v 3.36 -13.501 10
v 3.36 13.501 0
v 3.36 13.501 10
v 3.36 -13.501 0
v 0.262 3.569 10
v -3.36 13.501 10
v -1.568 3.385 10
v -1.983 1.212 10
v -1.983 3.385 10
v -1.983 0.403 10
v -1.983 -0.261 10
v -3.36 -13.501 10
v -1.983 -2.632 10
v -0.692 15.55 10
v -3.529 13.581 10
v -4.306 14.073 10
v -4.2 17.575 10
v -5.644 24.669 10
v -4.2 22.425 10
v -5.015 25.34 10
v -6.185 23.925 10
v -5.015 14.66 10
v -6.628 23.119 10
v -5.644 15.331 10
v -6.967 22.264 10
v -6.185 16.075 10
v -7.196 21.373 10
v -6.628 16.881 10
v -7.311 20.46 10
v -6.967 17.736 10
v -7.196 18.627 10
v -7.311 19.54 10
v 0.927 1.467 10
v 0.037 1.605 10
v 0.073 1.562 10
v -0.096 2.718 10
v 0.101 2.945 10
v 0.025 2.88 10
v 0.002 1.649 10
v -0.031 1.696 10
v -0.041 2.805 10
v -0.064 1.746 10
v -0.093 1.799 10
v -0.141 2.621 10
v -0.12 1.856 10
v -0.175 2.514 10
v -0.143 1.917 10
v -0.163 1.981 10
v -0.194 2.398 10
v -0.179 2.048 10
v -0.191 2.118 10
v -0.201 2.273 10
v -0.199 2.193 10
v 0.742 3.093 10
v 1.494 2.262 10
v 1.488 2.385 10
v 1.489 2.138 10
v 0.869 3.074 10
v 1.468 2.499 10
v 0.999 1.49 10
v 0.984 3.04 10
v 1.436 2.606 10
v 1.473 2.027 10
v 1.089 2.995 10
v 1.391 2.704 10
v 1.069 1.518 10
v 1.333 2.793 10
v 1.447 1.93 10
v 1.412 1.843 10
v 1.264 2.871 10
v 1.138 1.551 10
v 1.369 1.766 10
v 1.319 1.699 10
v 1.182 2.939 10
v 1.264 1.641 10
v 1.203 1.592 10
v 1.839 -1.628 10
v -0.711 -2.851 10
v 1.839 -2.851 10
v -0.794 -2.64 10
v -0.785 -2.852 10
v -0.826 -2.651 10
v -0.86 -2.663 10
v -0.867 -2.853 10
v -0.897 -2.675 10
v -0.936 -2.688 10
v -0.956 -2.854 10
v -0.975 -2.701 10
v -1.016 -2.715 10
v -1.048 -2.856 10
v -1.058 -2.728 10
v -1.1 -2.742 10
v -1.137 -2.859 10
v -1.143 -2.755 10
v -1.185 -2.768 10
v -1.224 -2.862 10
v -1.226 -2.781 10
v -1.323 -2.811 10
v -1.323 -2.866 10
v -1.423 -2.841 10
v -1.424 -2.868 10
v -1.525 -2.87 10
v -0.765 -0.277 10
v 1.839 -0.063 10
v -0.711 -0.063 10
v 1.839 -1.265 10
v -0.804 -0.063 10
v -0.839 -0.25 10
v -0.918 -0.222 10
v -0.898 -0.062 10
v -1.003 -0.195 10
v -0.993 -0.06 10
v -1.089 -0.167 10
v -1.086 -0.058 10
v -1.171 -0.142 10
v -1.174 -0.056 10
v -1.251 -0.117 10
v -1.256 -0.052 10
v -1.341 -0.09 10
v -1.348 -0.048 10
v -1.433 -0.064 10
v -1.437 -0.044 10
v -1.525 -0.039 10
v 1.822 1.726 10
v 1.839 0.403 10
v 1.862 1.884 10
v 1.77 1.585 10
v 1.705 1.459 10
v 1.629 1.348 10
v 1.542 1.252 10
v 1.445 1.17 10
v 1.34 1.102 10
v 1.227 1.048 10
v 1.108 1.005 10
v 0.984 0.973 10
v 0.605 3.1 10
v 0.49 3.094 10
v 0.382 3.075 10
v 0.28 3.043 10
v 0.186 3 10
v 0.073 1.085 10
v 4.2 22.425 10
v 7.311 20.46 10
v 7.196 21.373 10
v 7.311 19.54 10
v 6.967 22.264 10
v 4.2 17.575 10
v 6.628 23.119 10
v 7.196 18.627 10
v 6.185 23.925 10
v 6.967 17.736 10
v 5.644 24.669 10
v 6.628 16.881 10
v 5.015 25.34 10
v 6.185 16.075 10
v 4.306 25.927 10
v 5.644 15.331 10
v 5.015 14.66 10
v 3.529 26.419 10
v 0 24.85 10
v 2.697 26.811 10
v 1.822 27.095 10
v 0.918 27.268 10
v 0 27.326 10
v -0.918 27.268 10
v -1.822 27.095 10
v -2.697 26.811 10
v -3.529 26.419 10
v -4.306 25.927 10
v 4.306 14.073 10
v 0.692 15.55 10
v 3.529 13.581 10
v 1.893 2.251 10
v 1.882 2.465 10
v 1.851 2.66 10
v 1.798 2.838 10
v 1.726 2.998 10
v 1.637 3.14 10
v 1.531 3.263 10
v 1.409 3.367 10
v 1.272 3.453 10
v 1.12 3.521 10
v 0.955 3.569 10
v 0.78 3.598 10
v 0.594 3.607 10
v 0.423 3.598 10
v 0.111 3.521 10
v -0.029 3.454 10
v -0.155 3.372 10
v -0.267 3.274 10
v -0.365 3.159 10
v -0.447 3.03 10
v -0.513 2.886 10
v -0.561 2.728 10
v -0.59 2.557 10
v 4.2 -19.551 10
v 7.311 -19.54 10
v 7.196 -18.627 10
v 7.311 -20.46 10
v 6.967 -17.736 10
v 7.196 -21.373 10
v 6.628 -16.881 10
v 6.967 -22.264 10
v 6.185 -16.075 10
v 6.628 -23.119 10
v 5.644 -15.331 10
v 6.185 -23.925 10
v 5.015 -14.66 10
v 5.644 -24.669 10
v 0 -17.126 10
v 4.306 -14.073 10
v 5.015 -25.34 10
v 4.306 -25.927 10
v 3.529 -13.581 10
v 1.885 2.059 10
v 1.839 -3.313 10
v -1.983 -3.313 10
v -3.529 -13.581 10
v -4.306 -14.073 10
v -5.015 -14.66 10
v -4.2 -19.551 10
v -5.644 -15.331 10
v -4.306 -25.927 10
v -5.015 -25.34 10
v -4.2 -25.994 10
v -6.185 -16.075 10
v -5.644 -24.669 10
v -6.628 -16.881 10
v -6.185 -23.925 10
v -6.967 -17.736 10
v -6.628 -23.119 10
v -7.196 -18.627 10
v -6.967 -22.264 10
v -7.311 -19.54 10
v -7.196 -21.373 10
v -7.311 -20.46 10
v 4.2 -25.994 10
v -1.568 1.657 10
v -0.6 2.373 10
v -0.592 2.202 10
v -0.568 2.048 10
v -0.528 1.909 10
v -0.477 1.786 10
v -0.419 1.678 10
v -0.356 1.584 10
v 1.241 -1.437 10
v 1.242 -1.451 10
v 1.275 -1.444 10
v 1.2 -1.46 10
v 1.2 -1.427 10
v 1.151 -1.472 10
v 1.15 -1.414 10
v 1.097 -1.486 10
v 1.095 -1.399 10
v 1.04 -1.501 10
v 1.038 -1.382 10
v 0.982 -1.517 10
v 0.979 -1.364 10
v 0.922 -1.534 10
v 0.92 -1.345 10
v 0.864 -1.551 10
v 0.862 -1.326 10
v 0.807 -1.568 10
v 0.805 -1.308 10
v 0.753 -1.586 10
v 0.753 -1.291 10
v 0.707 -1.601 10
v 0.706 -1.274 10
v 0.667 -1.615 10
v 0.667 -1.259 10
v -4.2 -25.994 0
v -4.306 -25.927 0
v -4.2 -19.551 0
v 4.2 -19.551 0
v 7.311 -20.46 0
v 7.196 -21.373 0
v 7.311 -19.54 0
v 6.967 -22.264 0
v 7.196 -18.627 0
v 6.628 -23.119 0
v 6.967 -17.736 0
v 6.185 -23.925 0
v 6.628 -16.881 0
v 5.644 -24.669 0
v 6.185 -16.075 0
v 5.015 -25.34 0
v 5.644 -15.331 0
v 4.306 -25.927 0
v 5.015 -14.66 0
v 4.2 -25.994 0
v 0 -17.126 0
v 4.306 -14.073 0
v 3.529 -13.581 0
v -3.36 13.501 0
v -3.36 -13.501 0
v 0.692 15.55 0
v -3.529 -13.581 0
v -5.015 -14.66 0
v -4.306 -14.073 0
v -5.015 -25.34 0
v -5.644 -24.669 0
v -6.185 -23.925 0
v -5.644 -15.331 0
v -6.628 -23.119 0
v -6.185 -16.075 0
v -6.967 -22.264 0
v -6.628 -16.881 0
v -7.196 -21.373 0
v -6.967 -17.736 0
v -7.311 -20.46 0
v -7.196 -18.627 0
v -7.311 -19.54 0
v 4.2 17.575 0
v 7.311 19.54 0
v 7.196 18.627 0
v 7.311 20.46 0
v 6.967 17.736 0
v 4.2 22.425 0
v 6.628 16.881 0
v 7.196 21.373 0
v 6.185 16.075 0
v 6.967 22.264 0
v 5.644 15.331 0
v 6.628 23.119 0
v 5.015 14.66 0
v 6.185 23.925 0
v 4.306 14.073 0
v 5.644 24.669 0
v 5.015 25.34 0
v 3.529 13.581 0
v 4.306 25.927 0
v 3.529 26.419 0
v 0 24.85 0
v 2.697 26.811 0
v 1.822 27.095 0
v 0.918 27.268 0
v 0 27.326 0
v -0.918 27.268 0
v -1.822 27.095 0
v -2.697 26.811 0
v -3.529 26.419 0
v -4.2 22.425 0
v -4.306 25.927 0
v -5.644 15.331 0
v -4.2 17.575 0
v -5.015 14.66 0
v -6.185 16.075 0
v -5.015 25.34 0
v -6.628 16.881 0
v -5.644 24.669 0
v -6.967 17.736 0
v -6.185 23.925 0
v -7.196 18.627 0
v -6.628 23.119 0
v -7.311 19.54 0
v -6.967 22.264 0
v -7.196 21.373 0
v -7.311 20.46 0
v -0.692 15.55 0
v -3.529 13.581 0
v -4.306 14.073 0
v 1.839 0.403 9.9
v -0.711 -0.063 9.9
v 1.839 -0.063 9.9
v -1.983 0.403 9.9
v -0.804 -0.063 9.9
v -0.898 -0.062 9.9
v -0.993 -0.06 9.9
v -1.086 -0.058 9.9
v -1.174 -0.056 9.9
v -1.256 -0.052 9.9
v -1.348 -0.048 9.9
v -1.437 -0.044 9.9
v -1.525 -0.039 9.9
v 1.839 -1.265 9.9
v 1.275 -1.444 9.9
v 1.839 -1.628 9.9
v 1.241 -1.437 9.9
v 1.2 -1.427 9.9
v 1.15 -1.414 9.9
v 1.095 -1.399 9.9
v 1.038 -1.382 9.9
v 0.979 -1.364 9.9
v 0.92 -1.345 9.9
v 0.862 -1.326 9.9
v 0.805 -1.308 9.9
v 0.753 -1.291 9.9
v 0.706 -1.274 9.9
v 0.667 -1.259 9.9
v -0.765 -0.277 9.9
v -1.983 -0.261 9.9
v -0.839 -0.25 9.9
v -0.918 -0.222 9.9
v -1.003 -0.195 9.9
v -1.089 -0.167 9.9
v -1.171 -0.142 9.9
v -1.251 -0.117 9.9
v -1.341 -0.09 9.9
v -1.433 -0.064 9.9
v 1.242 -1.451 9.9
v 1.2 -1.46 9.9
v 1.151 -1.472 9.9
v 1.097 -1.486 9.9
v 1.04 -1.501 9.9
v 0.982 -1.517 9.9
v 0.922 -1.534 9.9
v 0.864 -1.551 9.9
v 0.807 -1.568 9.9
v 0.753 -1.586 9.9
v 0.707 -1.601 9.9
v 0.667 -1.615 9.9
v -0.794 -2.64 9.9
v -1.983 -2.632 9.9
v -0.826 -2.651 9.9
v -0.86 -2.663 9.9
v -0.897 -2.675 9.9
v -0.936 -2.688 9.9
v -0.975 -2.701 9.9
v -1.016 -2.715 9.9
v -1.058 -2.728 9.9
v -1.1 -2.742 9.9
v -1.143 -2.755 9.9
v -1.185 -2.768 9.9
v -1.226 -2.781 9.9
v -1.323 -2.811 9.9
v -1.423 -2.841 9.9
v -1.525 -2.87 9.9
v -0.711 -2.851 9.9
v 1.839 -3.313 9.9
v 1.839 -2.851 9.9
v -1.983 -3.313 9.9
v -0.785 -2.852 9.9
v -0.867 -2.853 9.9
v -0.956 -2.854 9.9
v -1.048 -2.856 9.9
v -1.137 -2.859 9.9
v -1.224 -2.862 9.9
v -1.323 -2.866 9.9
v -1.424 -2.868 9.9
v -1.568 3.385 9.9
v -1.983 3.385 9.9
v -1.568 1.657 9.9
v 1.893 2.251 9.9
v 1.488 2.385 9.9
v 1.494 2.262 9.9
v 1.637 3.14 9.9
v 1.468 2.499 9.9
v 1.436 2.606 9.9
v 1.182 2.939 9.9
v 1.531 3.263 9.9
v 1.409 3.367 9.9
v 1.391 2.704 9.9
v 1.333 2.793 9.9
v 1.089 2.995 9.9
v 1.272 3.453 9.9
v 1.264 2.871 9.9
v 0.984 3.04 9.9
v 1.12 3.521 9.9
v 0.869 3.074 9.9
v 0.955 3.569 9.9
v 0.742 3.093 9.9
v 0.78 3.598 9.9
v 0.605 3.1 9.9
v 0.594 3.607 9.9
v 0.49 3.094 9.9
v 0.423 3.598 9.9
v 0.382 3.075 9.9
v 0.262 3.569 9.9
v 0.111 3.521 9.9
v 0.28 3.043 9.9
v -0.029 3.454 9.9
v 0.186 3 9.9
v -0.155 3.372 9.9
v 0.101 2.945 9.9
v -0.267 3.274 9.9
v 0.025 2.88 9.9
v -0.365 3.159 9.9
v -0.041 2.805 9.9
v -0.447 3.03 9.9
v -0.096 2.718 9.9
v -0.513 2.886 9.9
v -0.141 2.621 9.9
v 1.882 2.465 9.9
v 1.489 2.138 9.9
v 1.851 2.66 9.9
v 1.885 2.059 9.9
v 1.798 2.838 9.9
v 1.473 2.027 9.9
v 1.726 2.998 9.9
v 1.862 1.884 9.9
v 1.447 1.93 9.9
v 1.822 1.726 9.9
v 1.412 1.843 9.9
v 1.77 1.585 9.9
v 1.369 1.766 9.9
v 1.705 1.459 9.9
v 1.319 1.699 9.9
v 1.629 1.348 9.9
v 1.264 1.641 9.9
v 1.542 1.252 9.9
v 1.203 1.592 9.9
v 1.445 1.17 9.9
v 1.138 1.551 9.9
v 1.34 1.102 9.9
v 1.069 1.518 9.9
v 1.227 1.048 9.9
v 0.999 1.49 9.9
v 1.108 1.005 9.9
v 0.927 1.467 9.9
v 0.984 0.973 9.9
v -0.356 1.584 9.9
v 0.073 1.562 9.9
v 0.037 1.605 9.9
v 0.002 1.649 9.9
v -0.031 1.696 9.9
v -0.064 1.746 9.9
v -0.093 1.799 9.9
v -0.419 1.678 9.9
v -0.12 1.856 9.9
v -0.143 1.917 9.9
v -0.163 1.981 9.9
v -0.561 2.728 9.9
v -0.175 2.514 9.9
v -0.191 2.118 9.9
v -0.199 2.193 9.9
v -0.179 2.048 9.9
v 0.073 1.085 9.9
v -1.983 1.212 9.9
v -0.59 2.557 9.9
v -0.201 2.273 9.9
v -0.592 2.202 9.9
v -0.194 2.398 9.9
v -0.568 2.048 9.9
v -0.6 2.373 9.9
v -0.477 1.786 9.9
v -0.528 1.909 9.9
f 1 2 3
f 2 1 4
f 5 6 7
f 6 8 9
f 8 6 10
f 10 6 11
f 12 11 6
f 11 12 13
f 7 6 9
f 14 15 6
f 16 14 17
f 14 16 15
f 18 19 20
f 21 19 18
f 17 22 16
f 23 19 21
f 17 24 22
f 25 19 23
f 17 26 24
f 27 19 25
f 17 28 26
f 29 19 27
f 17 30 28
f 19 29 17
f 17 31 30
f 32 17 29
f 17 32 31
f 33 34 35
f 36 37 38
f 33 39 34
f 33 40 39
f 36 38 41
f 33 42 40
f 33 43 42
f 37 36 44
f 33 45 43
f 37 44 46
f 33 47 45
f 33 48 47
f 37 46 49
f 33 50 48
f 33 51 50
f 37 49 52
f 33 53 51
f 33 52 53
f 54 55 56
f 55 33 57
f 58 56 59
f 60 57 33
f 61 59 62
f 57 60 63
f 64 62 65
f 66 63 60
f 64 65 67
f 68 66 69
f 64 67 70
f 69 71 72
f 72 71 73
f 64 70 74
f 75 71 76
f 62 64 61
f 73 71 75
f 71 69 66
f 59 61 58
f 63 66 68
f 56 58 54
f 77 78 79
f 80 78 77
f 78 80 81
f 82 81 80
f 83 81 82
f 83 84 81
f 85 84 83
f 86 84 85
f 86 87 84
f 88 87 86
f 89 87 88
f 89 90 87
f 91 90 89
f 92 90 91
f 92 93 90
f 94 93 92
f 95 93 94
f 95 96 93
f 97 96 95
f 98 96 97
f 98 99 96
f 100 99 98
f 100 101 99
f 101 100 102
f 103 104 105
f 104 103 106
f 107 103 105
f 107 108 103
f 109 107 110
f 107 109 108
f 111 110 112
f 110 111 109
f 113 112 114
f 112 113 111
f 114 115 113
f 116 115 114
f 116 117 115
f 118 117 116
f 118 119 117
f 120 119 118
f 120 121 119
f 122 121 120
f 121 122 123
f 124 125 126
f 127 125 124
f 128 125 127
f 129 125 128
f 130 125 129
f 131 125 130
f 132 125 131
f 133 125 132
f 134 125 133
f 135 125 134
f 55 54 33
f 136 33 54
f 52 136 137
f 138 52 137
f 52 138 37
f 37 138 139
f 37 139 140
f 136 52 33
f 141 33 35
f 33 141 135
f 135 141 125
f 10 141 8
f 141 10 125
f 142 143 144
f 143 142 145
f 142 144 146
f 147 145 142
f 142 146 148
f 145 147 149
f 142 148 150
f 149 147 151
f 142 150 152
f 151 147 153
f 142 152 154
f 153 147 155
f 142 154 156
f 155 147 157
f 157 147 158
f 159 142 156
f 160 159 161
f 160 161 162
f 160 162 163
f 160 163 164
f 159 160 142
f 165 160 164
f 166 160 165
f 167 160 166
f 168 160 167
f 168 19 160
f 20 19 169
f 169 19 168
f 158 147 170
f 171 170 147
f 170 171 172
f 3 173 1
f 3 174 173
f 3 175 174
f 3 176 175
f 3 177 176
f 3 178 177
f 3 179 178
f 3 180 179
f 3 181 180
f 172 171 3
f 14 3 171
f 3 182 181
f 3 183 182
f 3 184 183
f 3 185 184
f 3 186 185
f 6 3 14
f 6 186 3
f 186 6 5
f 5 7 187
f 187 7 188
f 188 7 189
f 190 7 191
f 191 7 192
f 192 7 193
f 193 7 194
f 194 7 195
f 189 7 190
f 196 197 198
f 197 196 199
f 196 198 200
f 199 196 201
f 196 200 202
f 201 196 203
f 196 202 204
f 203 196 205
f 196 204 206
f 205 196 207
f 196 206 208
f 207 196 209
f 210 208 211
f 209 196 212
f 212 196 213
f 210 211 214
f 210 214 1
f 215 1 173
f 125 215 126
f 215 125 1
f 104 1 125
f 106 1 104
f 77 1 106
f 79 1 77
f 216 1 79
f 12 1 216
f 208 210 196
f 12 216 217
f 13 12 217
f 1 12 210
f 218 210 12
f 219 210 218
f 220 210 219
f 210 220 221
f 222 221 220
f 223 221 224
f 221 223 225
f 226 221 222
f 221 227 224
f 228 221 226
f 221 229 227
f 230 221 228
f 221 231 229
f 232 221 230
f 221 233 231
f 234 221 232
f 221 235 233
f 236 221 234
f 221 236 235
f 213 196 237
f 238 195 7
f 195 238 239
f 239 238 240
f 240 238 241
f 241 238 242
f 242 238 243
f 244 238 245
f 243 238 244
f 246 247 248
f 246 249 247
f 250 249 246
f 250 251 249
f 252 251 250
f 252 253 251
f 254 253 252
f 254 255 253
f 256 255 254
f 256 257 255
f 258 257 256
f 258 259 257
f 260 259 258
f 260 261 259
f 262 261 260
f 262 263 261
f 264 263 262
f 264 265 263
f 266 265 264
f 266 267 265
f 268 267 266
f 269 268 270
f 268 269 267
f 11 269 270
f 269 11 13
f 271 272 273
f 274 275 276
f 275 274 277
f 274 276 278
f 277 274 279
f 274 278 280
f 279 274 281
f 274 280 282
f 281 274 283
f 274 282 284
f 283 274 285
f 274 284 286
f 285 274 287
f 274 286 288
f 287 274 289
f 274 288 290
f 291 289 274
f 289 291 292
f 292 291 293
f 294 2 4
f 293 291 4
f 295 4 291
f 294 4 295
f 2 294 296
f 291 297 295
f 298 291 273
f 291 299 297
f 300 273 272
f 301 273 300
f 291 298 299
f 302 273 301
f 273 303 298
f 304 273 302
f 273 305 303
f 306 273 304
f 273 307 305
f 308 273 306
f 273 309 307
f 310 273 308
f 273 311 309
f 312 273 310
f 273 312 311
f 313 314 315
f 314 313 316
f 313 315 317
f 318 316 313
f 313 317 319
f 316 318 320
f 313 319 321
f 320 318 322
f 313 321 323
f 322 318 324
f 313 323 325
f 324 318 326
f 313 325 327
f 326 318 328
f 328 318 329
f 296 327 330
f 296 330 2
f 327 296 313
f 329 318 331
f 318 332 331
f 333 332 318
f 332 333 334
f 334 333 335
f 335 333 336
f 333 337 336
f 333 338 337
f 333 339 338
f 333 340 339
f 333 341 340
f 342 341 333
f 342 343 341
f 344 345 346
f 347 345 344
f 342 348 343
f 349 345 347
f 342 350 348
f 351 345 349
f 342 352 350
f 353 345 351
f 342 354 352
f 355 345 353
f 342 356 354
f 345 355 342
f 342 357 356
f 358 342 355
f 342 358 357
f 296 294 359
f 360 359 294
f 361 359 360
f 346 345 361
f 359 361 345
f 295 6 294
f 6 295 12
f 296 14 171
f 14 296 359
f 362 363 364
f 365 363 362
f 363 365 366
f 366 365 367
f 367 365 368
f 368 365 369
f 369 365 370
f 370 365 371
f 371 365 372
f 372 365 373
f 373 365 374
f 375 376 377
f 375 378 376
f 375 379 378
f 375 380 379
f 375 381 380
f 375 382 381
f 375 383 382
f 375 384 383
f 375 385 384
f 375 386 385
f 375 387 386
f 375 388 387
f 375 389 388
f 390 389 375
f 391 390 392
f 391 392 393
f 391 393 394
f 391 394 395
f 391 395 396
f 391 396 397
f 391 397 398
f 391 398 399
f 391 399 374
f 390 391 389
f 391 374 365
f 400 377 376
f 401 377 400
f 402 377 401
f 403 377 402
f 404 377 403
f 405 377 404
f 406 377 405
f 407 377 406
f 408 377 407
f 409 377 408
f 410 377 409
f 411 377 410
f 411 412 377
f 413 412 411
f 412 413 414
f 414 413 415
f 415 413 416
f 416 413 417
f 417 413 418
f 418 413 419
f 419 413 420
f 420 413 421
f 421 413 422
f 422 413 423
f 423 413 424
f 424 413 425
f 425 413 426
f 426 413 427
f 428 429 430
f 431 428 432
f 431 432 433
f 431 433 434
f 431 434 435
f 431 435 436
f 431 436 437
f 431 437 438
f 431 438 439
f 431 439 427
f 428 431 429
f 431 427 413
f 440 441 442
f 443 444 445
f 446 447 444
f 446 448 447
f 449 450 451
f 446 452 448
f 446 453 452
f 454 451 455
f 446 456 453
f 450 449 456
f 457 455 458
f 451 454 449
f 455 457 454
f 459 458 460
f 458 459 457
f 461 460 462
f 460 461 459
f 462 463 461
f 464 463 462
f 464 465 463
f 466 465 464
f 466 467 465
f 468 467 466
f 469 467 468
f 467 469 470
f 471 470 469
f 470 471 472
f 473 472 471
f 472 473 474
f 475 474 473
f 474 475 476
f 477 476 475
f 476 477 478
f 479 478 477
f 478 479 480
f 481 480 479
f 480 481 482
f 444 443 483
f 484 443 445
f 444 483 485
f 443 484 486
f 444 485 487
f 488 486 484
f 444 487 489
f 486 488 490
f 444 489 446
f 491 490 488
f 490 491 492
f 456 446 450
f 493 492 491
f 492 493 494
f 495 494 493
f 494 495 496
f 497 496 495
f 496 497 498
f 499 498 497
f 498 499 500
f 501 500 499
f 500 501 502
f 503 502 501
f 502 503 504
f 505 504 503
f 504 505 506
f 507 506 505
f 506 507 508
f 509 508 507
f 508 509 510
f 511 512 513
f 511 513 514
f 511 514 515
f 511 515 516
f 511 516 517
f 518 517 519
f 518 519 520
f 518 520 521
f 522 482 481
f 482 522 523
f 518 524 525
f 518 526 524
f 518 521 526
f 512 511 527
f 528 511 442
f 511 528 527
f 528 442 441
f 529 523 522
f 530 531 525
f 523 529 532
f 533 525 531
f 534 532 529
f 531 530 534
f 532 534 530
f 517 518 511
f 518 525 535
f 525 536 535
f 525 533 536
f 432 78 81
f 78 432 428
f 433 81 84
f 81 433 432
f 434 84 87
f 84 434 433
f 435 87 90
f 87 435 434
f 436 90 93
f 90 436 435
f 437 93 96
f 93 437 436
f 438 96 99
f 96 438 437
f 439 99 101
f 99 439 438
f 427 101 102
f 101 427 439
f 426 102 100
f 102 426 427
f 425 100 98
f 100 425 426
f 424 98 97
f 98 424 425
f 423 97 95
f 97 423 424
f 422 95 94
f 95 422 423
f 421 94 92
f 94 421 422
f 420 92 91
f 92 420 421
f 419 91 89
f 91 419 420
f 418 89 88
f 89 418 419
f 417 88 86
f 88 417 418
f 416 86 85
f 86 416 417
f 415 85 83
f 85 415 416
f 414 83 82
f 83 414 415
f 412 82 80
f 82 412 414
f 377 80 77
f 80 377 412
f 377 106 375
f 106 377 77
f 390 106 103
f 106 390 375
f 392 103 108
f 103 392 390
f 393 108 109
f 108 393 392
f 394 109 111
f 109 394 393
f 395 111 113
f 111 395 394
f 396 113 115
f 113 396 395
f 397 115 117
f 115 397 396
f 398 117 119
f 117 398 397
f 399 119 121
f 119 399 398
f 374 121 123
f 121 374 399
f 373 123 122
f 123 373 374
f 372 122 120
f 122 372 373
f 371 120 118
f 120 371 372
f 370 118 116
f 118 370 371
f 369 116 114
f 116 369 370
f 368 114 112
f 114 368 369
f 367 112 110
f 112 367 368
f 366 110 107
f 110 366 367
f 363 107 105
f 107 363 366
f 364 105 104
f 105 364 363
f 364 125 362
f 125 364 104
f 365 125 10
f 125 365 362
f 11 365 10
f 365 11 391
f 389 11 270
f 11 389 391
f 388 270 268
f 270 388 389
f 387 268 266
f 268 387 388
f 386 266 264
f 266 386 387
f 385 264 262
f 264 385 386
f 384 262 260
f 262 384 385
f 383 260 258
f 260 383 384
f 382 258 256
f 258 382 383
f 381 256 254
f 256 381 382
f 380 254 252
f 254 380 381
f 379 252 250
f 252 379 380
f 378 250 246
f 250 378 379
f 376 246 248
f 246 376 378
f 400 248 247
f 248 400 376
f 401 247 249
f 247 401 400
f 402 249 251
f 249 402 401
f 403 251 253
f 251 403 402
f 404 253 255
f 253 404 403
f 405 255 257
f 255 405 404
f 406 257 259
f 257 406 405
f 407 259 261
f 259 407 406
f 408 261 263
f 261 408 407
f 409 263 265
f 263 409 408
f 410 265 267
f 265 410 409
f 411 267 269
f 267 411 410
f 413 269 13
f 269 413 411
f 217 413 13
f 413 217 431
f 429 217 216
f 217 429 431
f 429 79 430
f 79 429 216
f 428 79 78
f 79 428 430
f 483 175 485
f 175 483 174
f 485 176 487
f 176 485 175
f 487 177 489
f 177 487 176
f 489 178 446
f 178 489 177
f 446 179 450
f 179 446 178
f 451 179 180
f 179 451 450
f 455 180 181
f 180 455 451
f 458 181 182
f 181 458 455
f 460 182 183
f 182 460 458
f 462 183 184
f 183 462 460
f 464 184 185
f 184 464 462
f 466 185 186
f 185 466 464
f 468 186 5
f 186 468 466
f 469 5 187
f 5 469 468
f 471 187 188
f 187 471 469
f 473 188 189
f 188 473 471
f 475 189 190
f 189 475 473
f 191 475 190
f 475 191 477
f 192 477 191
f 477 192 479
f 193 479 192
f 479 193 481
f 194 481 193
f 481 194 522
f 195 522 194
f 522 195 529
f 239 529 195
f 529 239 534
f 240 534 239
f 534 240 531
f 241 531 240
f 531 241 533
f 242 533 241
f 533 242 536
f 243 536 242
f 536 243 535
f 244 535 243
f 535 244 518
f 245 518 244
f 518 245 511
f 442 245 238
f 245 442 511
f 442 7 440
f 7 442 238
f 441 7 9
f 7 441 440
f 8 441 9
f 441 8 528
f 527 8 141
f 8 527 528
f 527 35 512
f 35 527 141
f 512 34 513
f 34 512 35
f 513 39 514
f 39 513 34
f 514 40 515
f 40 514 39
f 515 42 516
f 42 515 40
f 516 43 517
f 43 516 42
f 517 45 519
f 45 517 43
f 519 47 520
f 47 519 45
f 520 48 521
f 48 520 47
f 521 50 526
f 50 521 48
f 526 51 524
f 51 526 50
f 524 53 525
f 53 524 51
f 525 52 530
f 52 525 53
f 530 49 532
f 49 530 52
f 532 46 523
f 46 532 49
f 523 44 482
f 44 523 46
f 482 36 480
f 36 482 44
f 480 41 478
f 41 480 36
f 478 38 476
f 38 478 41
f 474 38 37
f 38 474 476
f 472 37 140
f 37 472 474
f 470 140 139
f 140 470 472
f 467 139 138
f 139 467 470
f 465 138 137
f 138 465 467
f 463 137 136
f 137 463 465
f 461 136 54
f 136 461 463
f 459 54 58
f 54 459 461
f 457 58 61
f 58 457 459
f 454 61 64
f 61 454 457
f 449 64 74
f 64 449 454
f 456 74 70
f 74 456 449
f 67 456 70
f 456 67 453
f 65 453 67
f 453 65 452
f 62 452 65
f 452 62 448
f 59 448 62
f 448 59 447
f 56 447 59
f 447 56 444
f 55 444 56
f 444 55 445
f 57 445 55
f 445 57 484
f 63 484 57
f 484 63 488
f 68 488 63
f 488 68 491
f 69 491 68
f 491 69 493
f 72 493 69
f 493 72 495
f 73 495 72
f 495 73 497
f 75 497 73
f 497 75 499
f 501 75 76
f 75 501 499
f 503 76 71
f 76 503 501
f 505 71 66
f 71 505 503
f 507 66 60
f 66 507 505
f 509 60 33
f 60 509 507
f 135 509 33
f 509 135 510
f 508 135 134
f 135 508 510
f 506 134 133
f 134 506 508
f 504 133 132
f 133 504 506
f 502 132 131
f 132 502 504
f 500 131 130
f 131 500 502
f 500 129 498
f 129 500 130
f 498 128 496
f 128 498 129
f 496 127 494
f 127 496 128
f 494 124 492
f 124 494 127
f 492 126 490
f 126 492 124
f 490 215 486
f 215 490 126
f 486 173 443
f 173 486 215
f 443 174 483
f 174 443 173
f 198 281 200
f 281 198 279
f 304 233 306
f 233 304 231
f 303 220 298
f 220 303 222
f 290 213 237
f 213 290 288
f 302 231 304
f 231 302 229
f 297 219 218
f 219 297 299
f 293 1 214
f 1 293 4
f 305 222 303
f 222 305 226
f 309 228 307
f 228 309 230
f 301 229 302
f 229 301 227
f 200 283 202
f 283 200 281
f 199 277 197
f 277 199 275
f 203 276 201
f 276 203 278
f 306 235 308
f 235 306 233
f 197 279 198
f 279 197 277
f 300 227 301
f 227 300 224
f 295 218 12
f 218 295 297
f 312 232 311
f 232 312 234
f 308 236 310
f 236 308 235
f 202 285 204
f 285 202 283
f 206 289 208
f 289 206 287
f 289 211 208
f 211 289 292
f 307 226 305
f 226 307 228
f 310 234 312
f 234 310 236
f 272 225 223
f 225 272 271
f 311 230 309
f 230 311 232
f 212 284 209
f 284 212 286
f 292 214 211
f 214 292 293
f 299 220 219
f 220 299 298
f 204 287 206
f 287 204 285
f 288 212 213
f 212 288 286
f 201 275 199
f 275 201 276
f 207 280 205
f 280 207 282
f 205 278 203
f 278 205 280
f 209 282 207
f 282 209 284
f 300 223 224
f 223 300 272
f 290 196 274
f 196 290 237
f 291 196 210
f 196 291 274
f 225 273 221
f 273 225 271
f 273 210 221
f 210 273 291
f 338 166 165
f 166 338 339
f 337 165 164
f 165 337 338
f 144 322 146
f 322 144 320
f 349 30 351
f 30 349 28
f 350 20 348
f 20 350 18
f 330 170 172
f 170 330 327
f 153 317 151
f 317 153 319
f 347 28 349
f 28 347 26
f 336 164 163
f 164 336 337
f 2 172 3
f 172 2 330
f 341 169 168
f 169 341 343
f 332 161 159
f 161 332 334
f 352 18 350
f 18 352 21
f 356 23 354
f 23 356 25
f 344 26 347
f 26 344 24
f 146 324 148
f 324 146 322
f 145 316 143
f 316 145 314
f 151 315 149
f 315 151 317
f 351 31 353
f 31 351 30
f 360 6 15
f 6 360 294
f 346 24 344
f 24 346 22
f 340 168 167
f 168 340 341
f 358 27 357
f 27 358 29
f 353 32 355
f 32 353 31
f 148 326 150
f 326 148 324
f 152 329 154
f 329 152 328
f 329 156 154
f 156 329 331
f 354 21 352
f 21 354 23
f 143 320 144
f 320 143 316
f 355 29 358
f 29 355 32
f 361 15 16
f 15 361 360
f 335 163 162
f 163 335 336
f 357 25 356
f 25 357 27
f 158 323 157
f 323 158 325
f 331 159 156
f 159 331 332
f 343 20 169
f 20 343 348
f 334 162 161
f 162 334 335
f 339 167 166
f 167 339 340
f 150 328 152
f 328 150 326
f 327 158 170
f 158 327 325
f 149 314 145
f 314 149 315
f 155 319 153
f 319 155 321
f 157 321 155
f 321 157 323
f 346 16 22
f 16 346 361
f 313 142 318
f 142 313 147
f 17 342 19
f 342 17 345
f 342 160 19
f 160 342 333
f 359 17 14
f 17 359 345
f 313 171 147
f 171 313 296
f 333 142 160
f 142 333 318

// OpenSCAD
                        //******************************************
                        //* Base configuration
                        //******************************************
                        
                        //Set the nut properties
                        NUT_DIMENSION_METRIC = /*M*/5; // this is the number after M (eg. M4 -> 4)
                        // >>> NOTE <<<
                        // the metric parameter works ONLY for nuts from M1.6 up to M20
                        // If your nut has different size, please set it here:
                        // (leave -1 if you use metric)
                        NUT_DIMENSION = -1/*mm*/;
                        
                        WRENCH_THICKNESS_MM         = 10;    // this is the thickness of the wrench   
                        WRENCH_LENGHT_MM            = 40;   // this is the lenght of the wrench
                        CORRECT_LENGTH_IF_TOO_SHORT = true; // correct wrench lenght if is too short according with nut size
                        
                        // Choose if you want both closed and open heads, or only one of them
                        ADD_OPEN_HEAD = true;
                        ADD_CLOSED_HEAD = true;
                        
                        //-------------------------------------------------------
                        // PRINT HINTS
                        // Higher the infill rate is, stronger the wrench will be
                        // I suggest, at least, a 30% honeycomb fill
                        //-------------------------------------------------------
                        
                        
                        
                        //******************************************
                        //* Advanced configuration
                        //******************************************
                        // Change thickness of the border around nut hole
                        // A thicker border make wrench stronger, but wider
                        //  - Positive value: additional thickness around nut hole
                        //  - Negative value: less thickness around nut hole
                        fHeadBoardersAdditionalThickness = 0;
                        
                        // According to your printer precision, you can change 
                        // the 'nut holes offset' value. This affect the size of nut hole.
                        // Positive value: bigger hole
                        // Negative value: smaller hole
                        fNutHoleOffet = 0.2;
                        
                        
                        
                        
                        
                        
                        
                        
                        
                        //********************************************************************************
                        //* Do not modify below this line
                        //********************************************************************************
                        
                        // Variables cannot be assigned with if statement, so do this trick
                        iNutDiameter = (NUT_DIMENSION > 0) ? (NUT_DIMENSION) : (
                            (NUT_DIMENSION_METRIC == 1.6) ? 3.2 : (
                                (NUT_DIMENSION_METRIC == 2) ? 4 : (
                                    (NUT_DIMENSION_METRIC == 2.5) ? 5 : (
                                        (NUT_DIMENSION_METRIC == 3) ? 5.5 : (
                                            (NUT_DIMENSION_METRIC == 4) ? 7 : (
                                                (NUT_DIMENSION_METRIC == 5) ? 8 : (
                                                    (NUT_DIMENSION_METRIC == 6) ? 10 : (
                                                        (NUT_DIMENSION_METRIC == 8) ? 13 : (
                                                            (NUT_DIMENSION_METRIC == 10) ? 16 : (
                                                                (NUT_DIMENSION_METRIC == 12) ? 18 : (
                                                                    (NUT_DIMENSION_METRIC == 14) ? 21 : (
                                                                        (NUT_DIMENSION_METRIC == 16) ? 24 : (
                                                                            (NUT_DIMENSION_METRIC == 20) ? 30 : (
                                                                                // For nut > M20 or not standard return 0
                                                                                0
                                                                            )
                                                                        )
                                                                    )
                                                                )
                                                            )
                                                        )
                                                    )
                                                )
                                            )
                                        )
                                    )
                                )
                            )
                        );
                        
                        iNutThickness = WRENCH_THICKNESS_MM;
                        
                        // Calculate the radius of cylinder which model the nut 
                        // (it will be a 6-faces cylinder, so an hexagon)
                        iNutCylinderRadius = iNutDiameter/2 + fNutHoleOffet;
                        
                        // Calculate the radius of the circular part around the
                        // nut hole.
                        
                        
                        // Calculate the header space around nut hole using
                        // linear function
                        iHeadSpaceForM2 = min(2, fHeadBoardersAdditionalThickness);
                        iHeadSpaceForM10 = 7 + fHeadBoardersAdditionalThickness;  // 13mm of diameter
                        
                        iM2Diameter = 4;
                        iM10Diameter = 13;
                        // two points are:
                        // A = (iM2Diameter, iHeadSpaceForM2) 
                        // B = (iM10Diameter, iHeadSpaceForM10)
                        //              yB - yA
                        //    y - yA = -------- (x - xA)
                        //              xB - xA
                        iHeaderRadiusOffset = ((iHeadSpaceForM10-iHeadSpaceForM2) / (iM10Diameter-iM2Diameter)) * (iNutDiameter - iM2Diameter) + iHeadSpaceForM2;
                        
                        //iHeaderRadiusOffset = 0.225*iNutDiameter + 0.75;
                        
                        echo("Nut diameter is:", iNutDiameter);
                        echo("Offset is:", iHeaderRadiusOffset);
                        iHeadRadius = iNutCylinderRadius + iHeaderRadiusOffset;
                        
                        /*
                         * See this page:
                         * https://en.wikibooks.org/wiki/OpenSCAD_User_Manual/undersized_circular_objects
                         */
                        module cylinder_outer(height,radius,fn)
                        {
                           fudge = 1/cos(180/fn);
                           cylinder(h=height,r=radius*fudge,$fn=fn);
                        }
                        
                        module createNutProfile()
                        {
                            // Add a little bit of offset on the height and traslate down
                            // of the same amount, to avoid wrong booleand operation with
                            // the rounded section
                            iNutHeightOffset = 0.5;
                            translate([0,0,-iNutHeightOffset/2]){
                                rotate(a=[0,0,90]){
                                    // The nut profile is obtained from a cylinder with 6 faces
                                    cylinder_outer(iNutThickness+iNutHeightOffset, iNutCylinderRadius, 6);
                                }
                            }
                        }
                        
                        module createNutAdditionalSquaredHole(iPosY)
                        {
                            iSize = iNutCylinderRadius*2;
                            iHeightOffset = 0.2;
                            iHeight = WRENCH_THICKNESS_MM + iHeightOffset;
                            translate([0,iPosY,iHeight/2 - iHeightOffset/2]){
                                cube(size = [iSize, iSize, iHeight], center = true);
                            };
                        }
                        
                        module createCylindricalHead()
                        {
                            rotate(a=[0,0,90]){
                                cylinder_outer(iNutThickness, iHeadRadius, 50);
                            }
                        }
                        
                        module createOpenHead(iPosY=0)
                        {
                            translate([0,iPosY,0]){
                                /*
                                 * The nut hexagon is created via 'cylinder outer' so
                                 * the cylinder diameter is the length of face-to-face segment
                                 * and NOT the angle-to-angle segment.
                                 * So we need to calculate it
                                 * According to https://en.wikipedia.org/wiki/Hexagon we calculate
                                 * the value of 'R'based on 'r'
                                 */    
                                iNutAngleToAngleLenght = iNutCylinderRadius/ cos(30);    
                                // Do the same for the cylinder around the nut hole
                                iHeadAngleToAngleLenght = iHeadRadius/ cos(30);
                                
                                iAdjustNutPos = iNutAngleToAngleLenght/3;
                                
                                iDelta = (iHeadAngleToAngleLenght - iNutAngleToAngleLenght) - iAdjustNutPos - fHeadBoardersAdditionalThickness;
                               
                                difference(){
                                    createCylindricalHead();
                                    translate([0, -(iDelta), 0 / 2]) {
                                        createNutProfile();
                                    };
                                    createNutAdditionalSquaredHole(-(iDelta+iNutAngleToAngleLenght));
                                }
                                
                            }
                            
                        }
                        
                        module createClosedHead(iPosY=0)
                        {
                            translate([0,iPosY,0]){
                                difference(){
                                    createCylindricalHead();
                                    createNutProfile();
                                }
                            }
                        }
                        
                        module createRoundedHandleEdge(iPosY, iHandleWidth)
                        {
                            iRadius = iHandleWidth/2;
                            translate([0,iPosY,0]){
                                cylinder(h=WRENCH_THICKNESS_MM,r=iRadius,$fn=20);
                            }
                        }
                        
                        module create3DText(sText, iSize, iThickness)
                        {
                            font = "Arial";
                            //letter_size = 50;
                            //letter_height = 1;
                            // Use linear_extrude() to make the letters 3D objects as they
                            // are only 2D shapes when only using text()
                            
                            linear_extrude(height = iThickness) {
                                text(sText, size = iSize, font = font, halign = "center", valign = "center", $fn = 16);
                            }
                        }
                        
                        module addTextToHandle(sText, iPosY, iTextSize)
                        {
                            iTextThickness = 0.4;
                            
                            iTextSize = min(iTextSize, 5);
                            
                            iTextYOffsetToBooleanSubtraction = 0.1;
                            translate([0, iPosY, WRENCH_THICKNESS_MM - iTextYOffsetToBooleanSubtraction]){
                                rotate([0,0,90]){
                                    create3DText(sText, iTextSize - 1, iTextThickness + iTextYOffsetToBooleanSubtraction);
                                };
                            };
                        }
                        
                        iMinDist = 10;
                        function calculateCorrectedLenght() = ((WRENCH_LENGHT_MM - (iNutDiameter*2) > iMinDist) ? WRENCH_LENGHT_MM : (iNutDiameter*2 + iMinDist));
                        
                        function getWrenchLenght() = ( (CORRECT_LENGTH_IF_TOO_SHORT == true) ? calculateCorrectedLenght() : WRENCH_LENGHT_MM );
                        
                        module createHandle()
                        {
                            // Calculate if the length user set
                            iUserLenght = getWrenchLenght();
                            
                            iLength = iUserLenght - (iNutCylinderRadius*2 + 0.5);
                            iWidth = iNutCylinderRadius*1.6;
                            
                            sText = (NUT_DIMENSION > 0) ? (str(NUT_DIMENSION, "mm")) : (str("M", NUT_DIMENSION_METRIC));
                            
                            union(){
                                
                                difference(){
                                    // Create the handle with a parallelepiped
                                    translate([0,0,(WRENCH_THICKNESS_MM/2)]){
                                        cube(
                                            size = [
                                                iWidth,
                                                iLength,
                                                WRENCH_THICKNESS_MM
                                            ], 
                                            center = true
                                        );
                                    };
                                    // Subtract the text
                                    //addTextToHandle(sText, (iLength/2) - 5, iWidth);
                                    addTextToHandle(sText, 0, iWidth);
                                } // close difference()
                                
                                // Put a rounded edge if not both head exist
                                if( ADD_OPEN_HEAD == false){
                                    createRoundedHandleEdge(-(iLength/2), iWidth);
                                }
                                if(ADD_CLOSED_HEAD == false){
                                    createRoundedHandleEdge(iLength/2, iWidth);
                                }
                            } // close union()
                            
                        }
                        
                        
                        
                        
                        
                        
                        
                        // Create the handle section
                        createHandle();
                        // then closed and open section
                        iDistanceFromOrigin = getWrenchLenght()/2;
                        if( ADD_OPEN_HEAD == true){
                            createOpenHead(-iDistanceFromOrigin);
                        }
                        if( ADD_CLOSED_HEAD == true){
                            createClosedHead(iDistanceFromOrigin);
                        }
                    
